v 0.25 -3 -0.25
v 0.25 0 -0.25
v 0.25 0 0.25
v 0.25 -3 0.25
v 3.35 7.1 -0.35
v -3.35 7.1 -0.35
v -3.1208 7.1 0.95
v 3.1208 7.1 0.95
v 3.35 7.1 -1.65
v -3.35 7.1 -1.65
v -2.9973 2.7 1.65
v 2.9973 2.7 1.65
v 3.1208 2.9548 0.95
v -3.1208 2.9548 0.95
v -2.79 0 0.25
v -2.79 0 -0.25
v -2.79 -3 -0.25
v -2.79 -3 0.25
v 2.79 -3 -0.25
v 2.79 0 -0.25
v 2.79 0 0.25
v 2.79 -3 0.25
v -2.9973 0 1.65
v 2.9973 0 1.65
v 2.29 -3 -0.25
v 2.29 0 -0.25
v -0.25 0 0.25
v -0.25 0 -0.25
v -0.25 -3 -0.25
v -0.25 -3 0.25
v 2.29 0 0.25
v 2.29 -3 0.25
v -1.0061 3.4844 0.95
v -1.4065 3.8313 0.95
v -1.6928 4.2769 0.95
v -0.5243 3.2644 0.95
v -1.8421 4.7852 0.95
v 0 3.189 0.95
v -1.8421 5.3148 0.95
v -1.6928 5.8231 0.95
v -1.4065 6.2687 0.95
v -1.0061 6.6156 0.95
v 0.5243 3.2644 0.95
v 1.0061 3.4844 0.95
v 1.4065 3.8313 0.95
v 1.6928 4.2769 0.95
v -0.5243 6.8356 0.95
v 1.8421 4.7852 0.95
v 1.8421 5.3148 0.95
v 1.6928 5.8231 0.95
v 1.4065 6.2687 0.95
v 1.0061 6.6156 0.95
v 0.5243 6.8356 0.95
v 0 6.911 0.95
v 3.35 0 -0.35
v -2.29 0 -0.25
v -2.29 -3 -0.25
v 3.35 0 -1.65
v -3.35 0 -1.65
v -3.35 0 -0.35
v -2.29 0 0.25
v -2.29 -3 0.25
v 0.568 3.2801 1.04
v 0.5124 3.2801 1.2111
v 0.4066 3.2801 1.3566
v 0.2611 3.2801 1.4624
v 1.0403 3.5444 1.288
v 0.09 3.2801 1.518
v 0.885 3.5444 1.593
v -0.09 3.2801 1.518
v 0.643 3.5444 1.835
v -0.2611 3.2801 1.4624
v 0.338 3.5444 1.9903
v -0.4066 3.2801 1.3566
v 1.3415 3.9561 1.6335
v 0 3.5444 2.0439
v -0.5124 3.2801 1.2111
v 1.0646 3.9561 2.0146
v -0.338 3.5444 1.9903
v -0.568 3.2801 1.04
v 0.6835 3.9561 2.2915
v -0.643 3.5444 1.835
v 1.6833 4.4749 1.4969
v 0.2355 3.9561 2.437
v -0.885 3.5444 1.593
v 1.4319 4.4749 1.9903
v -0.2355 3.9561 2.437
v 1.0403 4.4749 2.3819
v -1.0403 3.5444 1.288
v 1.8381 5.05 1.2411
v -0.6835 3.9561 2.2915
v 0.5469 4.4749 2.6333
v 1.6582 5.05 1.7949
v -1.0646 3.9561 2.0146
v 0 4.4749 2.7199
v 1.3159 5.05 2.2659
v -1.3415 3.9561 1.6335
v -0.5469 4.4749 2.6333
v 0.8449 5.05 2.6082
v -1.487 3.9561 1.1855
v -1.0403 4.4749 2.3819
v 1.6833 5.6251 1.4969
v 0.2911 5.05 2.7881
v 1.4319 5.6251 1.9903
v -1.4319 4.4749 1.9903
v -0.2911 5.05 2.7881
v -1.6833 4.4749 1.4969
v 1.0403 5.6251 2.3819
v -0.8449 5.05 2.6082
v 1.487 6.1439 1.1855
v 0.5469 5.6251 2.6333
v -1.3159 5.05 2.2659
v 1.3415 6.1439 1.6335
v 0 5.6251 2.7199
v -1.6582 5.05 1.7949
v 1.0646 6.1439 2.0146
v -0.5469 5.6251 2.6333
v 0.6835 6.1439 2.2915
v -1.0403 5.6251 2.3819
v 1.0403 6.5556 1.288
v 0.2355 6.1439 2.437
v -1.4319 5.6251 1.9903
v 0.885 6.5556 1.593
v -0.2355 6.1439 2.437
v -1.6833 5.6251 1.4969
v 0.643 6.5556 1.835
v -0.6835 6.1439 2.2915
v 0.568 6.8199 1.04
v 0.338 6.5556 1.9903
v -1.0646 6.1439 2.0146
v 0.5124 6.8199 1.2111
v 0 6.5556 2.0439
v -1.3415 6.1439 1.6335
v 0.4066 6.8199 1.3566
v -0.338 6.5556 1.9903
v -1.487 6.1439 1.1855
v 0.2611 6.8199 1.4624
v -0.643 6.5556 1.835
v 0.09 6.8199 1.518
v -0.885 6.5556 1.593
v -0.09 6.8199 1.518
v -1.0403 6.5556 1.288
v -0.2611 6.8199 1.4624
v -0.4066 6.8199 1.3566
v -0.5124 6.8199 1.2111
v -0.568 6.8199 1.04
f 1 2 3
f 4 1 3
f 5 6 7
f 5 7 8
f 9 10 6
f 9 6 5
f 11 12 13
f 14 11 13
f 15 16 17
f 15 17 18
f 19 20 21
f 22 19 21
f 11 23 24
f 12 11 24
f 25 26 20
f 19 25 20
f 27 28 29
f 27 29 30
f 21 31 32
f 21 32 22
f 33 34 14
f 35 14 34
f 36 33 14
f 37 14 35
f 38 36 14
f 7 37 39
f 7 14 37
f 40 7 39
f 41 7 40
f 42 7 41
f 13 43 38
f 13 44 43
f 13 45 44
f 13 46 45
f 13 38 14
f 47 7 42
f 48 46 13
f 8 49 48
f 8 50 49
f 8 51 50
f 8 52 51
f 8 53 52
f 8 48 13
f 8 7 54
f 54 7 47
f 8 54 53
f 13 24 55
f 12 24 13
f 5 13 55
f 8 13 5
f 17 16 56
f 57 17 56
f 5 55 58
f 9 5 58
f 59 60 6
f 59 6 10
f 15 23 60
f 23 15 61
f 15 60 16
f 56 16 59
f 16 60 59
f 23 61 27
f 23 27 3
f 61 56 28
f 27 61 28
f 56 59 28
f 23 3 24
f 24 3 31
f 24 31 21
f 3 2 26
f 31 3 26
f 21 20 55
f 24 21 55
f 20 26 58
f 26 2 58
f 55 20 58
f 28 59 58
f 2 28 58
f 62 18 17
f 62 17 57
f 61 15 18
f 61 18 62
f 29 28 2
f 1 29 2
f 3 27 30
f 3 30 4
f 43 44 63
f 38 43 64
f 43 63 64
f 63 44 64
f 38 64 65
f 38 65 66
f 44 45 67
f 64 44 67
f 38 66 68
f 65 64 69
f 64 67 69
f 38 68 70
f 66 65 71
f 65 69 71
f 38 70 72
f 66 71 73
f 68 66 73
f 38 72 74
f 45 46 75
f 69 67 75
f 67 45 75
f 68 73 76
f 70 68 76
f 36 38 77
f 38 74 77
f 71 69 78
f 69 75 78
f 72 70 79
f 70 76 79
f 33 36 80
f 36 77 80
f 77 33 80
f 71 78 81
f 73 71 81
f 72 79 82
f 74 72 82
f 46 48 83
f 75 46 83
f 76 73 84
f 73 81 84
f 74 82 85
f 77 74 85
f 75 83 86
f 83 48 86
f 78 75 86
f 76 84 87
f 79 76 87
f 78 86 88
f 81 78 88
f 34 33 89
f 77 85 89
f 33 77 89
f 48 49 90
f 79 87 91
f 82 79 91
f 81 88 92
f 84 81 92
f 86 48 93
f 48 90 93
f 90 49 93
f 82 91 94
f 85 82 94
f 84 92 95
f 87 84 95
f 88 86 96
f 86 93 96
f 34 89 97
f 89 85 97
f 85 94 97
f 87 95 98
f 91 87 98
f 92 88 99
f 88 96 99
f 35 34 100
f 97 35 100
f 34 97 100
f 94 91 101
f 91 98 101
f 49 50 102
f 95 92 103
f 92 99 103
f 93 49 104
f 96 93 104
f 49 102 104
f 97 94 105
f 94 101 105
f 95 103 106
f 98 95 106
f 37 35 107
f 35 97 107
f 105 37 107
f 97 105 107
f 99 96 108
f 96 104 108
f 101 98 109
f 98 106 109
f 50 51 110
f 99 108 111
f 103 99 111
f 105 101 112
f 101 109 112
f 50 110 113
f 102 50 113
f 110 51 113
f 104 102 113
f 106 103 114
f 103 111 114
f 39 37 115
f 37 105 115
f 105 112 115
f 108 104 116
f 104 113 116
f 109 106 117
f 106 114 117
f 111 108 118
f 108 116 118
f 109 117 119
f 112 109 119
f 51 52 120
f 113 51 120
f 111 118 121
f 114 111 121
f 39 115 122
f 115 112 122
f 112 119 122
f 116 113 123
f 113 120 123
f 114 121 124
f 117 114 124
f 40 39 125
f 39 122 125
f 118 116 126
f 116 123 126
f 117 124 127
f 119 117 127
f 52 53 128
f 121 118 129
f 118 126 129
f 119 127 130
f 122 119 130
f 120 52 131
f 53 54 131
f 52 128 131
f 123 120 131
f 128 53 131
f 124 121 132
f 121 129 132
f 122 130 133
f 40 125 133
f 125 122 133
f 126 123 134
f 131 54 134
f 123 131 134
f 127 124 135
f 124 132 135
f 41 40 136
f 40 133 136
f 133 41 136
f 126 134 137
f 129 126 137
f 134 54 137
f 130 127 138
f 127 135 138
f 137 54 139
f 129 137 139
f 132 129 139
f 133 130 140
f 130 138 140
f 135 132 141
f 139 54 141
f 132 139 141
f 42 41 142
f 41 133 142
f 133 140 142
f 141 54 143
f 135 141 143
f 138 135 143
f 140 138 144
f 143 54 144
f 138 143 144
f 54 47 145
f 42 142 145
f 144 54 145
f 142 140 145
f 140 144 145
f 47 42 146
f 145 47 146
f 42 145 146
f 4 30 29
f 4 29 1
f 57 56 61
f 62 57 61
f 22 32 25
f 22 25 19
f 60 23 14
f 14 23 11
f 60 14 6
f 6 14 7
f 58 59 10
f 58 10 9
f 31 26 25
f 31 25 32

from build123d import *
from OCP.BRepFilletAPI import BRepFilletAPI_MakeChamfer

# Parameters (mm, degrees)
ESBO_O1_W                = 6.7
ESBO_O1_H                = 3.3
RESSALTO_EXTRUS_O1_DEPTH = 7.1
ESBO_O2_W                = 6.7
ESBO_O2_H                = 4.1
CORTE_EXTRUS_O1_DEPTH    = 0.7
REVOLU_O1_ANGLE          = 180
ESBO_O4_W                = 0.5
ESBO_O4_H                = 0.5
RESSALTO_EXTRUS_O2_DEPTH = 3
CHANFRO1_SIZE            = 0.3
CHANFRO1_SIZE_2          = 0.824243226
CHANFRO2_SIZE            = 2
CHANFRO2_SIZE2           = 0.352653961


with BuildPart() as part:
    # Esboço1 → Ressalto-extrusão1 (new body)
    with BuildSketch(Plane(origin=(0, 0, 0), x_dir=(1, 0, 0), z_dir=(0, 1, 0))):
        Rectangle(ESBO_O1_W, ESBO_O1_H)
    extrude(amount=RESSALTO_EXTRUS_O1_DEPTH)

    # Esboço2 → Corte-extrusão1 (cut)
    with BuildSketch(Plane.XY.offset(1.65)):
        with Locations((0, 5.05)):
            Rectangle(ESBO_O2_W, ESBO_O2_H)
    extrude(amount=-CORTE_EXTRUS_O1_DEPTH, mode=Mode.SUBTRACT)

    # Esboço3 → Revolução1 (revolve)
    with BuildSketch(Plane.XY.offset(0.95)):
        with BuildLine():
            Line((0, 6.911003495), (0, 3.188996505))
            ThreePointArc((0, 3.188996505), (1.861003495, 5.05), (0, 6.911003495))
        make_face()
    revolve(axis=Axis((0, 7.1, 0.95), (0, -1, 0)), revolution_arc=REVOLU_O1_ANGLE)

    # Esboço4 → Ressalto-extrusão2 (add)
    with BuildSketch(Plane.XZ):
        Rectangle(ESBO_O4_W, ESBO_O4_H)
        with Locations((-2.54, 0)):
            Rectangle(ESBO_O4_W, ESBO_O4_H)
        with Locations((2.54, 0)):
            Rectangle(ESBO_O4_W, ESBO_O4_H)
    extrude(amount=RESSALTO_EXTRUS_O2_DEPTH)

    # Chanfro1
    # the kernel refuses this chamfer: 0.824243226, 0.3 mm, written as the material it takes off along each edge
    with BuildSketch(Plane(origin=(5.488247435, 3, 1.65), x_dir=(0, -0.9950833631817485, 0.09904090225205103), z_dir=(-1, 0, 0))) as chanfro1_piece_1_section:
        Polygon((CHANFRO1_SIZE * 0.995083363182, -CHANFRO1_SIZE * 0.0990409022521), (-CHANFRO1_SIZE_2 * 0.0990409022324, -CHANFRO1_SIZE_2 * 0.995083362984), (0, 0), align=None)
    chanfro1_piece_1 = extrude(amount=10.97649487, mode=Mode.PRIVATE)
    chanfro1_piece_1 = split(chanfro1_piece_1, bisect_by=Plane(origin=(0, 2.90340276, 0.95), z_dir=(0, 0, 1)), keep=Keep.TOP, mode=Mode.PRIVATE)
    add(chanfro1_piece_1, mode=Mode.SUBTRACT)

    # Chanfro2: one chamfer whose edges measure the first distance from different faces: ONE call of the kernel's chamfer builder (chamfer() names one face for all edges)
    chanfro2_edges_1 = [part.edges().sort_by_distance(p)[0] for p in [
        (3.35, 1.35, 1.65),
    ]]
    chanfro2_side_1 = [part.faces().sort_by_distance(p)[0] for p in [
        (3.35, 3.34322922, -0.190735653),
    ]]
    chanfro2_edges_2 = [part.edges().sort_by_distance(p)[0] for p in [
        (-3.35, 1.35, 1.65),
    ]]
    chanfro2_side_2 = [part.faces().sort_by_distance(p)[0] for p in [
        (-3.35, 3.34322922, -0.190735653),
    ]]
    chanfro2 = BRepFilletAPI_MakeChamfer(part.part.solid().wrapped)
    for e in chanfro2_edges_1:
        chanfro2.Add(CHANFRO2_SIZE, CHANFRO2_SIZE2, e.wrapped, chanfro2_side_1[0].wrapped)  # the first distance lies on this face
    for e in chanfro2_edges_2:
        chanfro2.Add(CHANFRO2_SIZE, CHANFRO2_SIZE2, e.wrapped, chanfro2_side_2[0].wrapped)  # the first distance lies on this face
    add(Compound.cast(chanfro2.Shape()), mode=Mode.REPLACE)


solid = part.part
